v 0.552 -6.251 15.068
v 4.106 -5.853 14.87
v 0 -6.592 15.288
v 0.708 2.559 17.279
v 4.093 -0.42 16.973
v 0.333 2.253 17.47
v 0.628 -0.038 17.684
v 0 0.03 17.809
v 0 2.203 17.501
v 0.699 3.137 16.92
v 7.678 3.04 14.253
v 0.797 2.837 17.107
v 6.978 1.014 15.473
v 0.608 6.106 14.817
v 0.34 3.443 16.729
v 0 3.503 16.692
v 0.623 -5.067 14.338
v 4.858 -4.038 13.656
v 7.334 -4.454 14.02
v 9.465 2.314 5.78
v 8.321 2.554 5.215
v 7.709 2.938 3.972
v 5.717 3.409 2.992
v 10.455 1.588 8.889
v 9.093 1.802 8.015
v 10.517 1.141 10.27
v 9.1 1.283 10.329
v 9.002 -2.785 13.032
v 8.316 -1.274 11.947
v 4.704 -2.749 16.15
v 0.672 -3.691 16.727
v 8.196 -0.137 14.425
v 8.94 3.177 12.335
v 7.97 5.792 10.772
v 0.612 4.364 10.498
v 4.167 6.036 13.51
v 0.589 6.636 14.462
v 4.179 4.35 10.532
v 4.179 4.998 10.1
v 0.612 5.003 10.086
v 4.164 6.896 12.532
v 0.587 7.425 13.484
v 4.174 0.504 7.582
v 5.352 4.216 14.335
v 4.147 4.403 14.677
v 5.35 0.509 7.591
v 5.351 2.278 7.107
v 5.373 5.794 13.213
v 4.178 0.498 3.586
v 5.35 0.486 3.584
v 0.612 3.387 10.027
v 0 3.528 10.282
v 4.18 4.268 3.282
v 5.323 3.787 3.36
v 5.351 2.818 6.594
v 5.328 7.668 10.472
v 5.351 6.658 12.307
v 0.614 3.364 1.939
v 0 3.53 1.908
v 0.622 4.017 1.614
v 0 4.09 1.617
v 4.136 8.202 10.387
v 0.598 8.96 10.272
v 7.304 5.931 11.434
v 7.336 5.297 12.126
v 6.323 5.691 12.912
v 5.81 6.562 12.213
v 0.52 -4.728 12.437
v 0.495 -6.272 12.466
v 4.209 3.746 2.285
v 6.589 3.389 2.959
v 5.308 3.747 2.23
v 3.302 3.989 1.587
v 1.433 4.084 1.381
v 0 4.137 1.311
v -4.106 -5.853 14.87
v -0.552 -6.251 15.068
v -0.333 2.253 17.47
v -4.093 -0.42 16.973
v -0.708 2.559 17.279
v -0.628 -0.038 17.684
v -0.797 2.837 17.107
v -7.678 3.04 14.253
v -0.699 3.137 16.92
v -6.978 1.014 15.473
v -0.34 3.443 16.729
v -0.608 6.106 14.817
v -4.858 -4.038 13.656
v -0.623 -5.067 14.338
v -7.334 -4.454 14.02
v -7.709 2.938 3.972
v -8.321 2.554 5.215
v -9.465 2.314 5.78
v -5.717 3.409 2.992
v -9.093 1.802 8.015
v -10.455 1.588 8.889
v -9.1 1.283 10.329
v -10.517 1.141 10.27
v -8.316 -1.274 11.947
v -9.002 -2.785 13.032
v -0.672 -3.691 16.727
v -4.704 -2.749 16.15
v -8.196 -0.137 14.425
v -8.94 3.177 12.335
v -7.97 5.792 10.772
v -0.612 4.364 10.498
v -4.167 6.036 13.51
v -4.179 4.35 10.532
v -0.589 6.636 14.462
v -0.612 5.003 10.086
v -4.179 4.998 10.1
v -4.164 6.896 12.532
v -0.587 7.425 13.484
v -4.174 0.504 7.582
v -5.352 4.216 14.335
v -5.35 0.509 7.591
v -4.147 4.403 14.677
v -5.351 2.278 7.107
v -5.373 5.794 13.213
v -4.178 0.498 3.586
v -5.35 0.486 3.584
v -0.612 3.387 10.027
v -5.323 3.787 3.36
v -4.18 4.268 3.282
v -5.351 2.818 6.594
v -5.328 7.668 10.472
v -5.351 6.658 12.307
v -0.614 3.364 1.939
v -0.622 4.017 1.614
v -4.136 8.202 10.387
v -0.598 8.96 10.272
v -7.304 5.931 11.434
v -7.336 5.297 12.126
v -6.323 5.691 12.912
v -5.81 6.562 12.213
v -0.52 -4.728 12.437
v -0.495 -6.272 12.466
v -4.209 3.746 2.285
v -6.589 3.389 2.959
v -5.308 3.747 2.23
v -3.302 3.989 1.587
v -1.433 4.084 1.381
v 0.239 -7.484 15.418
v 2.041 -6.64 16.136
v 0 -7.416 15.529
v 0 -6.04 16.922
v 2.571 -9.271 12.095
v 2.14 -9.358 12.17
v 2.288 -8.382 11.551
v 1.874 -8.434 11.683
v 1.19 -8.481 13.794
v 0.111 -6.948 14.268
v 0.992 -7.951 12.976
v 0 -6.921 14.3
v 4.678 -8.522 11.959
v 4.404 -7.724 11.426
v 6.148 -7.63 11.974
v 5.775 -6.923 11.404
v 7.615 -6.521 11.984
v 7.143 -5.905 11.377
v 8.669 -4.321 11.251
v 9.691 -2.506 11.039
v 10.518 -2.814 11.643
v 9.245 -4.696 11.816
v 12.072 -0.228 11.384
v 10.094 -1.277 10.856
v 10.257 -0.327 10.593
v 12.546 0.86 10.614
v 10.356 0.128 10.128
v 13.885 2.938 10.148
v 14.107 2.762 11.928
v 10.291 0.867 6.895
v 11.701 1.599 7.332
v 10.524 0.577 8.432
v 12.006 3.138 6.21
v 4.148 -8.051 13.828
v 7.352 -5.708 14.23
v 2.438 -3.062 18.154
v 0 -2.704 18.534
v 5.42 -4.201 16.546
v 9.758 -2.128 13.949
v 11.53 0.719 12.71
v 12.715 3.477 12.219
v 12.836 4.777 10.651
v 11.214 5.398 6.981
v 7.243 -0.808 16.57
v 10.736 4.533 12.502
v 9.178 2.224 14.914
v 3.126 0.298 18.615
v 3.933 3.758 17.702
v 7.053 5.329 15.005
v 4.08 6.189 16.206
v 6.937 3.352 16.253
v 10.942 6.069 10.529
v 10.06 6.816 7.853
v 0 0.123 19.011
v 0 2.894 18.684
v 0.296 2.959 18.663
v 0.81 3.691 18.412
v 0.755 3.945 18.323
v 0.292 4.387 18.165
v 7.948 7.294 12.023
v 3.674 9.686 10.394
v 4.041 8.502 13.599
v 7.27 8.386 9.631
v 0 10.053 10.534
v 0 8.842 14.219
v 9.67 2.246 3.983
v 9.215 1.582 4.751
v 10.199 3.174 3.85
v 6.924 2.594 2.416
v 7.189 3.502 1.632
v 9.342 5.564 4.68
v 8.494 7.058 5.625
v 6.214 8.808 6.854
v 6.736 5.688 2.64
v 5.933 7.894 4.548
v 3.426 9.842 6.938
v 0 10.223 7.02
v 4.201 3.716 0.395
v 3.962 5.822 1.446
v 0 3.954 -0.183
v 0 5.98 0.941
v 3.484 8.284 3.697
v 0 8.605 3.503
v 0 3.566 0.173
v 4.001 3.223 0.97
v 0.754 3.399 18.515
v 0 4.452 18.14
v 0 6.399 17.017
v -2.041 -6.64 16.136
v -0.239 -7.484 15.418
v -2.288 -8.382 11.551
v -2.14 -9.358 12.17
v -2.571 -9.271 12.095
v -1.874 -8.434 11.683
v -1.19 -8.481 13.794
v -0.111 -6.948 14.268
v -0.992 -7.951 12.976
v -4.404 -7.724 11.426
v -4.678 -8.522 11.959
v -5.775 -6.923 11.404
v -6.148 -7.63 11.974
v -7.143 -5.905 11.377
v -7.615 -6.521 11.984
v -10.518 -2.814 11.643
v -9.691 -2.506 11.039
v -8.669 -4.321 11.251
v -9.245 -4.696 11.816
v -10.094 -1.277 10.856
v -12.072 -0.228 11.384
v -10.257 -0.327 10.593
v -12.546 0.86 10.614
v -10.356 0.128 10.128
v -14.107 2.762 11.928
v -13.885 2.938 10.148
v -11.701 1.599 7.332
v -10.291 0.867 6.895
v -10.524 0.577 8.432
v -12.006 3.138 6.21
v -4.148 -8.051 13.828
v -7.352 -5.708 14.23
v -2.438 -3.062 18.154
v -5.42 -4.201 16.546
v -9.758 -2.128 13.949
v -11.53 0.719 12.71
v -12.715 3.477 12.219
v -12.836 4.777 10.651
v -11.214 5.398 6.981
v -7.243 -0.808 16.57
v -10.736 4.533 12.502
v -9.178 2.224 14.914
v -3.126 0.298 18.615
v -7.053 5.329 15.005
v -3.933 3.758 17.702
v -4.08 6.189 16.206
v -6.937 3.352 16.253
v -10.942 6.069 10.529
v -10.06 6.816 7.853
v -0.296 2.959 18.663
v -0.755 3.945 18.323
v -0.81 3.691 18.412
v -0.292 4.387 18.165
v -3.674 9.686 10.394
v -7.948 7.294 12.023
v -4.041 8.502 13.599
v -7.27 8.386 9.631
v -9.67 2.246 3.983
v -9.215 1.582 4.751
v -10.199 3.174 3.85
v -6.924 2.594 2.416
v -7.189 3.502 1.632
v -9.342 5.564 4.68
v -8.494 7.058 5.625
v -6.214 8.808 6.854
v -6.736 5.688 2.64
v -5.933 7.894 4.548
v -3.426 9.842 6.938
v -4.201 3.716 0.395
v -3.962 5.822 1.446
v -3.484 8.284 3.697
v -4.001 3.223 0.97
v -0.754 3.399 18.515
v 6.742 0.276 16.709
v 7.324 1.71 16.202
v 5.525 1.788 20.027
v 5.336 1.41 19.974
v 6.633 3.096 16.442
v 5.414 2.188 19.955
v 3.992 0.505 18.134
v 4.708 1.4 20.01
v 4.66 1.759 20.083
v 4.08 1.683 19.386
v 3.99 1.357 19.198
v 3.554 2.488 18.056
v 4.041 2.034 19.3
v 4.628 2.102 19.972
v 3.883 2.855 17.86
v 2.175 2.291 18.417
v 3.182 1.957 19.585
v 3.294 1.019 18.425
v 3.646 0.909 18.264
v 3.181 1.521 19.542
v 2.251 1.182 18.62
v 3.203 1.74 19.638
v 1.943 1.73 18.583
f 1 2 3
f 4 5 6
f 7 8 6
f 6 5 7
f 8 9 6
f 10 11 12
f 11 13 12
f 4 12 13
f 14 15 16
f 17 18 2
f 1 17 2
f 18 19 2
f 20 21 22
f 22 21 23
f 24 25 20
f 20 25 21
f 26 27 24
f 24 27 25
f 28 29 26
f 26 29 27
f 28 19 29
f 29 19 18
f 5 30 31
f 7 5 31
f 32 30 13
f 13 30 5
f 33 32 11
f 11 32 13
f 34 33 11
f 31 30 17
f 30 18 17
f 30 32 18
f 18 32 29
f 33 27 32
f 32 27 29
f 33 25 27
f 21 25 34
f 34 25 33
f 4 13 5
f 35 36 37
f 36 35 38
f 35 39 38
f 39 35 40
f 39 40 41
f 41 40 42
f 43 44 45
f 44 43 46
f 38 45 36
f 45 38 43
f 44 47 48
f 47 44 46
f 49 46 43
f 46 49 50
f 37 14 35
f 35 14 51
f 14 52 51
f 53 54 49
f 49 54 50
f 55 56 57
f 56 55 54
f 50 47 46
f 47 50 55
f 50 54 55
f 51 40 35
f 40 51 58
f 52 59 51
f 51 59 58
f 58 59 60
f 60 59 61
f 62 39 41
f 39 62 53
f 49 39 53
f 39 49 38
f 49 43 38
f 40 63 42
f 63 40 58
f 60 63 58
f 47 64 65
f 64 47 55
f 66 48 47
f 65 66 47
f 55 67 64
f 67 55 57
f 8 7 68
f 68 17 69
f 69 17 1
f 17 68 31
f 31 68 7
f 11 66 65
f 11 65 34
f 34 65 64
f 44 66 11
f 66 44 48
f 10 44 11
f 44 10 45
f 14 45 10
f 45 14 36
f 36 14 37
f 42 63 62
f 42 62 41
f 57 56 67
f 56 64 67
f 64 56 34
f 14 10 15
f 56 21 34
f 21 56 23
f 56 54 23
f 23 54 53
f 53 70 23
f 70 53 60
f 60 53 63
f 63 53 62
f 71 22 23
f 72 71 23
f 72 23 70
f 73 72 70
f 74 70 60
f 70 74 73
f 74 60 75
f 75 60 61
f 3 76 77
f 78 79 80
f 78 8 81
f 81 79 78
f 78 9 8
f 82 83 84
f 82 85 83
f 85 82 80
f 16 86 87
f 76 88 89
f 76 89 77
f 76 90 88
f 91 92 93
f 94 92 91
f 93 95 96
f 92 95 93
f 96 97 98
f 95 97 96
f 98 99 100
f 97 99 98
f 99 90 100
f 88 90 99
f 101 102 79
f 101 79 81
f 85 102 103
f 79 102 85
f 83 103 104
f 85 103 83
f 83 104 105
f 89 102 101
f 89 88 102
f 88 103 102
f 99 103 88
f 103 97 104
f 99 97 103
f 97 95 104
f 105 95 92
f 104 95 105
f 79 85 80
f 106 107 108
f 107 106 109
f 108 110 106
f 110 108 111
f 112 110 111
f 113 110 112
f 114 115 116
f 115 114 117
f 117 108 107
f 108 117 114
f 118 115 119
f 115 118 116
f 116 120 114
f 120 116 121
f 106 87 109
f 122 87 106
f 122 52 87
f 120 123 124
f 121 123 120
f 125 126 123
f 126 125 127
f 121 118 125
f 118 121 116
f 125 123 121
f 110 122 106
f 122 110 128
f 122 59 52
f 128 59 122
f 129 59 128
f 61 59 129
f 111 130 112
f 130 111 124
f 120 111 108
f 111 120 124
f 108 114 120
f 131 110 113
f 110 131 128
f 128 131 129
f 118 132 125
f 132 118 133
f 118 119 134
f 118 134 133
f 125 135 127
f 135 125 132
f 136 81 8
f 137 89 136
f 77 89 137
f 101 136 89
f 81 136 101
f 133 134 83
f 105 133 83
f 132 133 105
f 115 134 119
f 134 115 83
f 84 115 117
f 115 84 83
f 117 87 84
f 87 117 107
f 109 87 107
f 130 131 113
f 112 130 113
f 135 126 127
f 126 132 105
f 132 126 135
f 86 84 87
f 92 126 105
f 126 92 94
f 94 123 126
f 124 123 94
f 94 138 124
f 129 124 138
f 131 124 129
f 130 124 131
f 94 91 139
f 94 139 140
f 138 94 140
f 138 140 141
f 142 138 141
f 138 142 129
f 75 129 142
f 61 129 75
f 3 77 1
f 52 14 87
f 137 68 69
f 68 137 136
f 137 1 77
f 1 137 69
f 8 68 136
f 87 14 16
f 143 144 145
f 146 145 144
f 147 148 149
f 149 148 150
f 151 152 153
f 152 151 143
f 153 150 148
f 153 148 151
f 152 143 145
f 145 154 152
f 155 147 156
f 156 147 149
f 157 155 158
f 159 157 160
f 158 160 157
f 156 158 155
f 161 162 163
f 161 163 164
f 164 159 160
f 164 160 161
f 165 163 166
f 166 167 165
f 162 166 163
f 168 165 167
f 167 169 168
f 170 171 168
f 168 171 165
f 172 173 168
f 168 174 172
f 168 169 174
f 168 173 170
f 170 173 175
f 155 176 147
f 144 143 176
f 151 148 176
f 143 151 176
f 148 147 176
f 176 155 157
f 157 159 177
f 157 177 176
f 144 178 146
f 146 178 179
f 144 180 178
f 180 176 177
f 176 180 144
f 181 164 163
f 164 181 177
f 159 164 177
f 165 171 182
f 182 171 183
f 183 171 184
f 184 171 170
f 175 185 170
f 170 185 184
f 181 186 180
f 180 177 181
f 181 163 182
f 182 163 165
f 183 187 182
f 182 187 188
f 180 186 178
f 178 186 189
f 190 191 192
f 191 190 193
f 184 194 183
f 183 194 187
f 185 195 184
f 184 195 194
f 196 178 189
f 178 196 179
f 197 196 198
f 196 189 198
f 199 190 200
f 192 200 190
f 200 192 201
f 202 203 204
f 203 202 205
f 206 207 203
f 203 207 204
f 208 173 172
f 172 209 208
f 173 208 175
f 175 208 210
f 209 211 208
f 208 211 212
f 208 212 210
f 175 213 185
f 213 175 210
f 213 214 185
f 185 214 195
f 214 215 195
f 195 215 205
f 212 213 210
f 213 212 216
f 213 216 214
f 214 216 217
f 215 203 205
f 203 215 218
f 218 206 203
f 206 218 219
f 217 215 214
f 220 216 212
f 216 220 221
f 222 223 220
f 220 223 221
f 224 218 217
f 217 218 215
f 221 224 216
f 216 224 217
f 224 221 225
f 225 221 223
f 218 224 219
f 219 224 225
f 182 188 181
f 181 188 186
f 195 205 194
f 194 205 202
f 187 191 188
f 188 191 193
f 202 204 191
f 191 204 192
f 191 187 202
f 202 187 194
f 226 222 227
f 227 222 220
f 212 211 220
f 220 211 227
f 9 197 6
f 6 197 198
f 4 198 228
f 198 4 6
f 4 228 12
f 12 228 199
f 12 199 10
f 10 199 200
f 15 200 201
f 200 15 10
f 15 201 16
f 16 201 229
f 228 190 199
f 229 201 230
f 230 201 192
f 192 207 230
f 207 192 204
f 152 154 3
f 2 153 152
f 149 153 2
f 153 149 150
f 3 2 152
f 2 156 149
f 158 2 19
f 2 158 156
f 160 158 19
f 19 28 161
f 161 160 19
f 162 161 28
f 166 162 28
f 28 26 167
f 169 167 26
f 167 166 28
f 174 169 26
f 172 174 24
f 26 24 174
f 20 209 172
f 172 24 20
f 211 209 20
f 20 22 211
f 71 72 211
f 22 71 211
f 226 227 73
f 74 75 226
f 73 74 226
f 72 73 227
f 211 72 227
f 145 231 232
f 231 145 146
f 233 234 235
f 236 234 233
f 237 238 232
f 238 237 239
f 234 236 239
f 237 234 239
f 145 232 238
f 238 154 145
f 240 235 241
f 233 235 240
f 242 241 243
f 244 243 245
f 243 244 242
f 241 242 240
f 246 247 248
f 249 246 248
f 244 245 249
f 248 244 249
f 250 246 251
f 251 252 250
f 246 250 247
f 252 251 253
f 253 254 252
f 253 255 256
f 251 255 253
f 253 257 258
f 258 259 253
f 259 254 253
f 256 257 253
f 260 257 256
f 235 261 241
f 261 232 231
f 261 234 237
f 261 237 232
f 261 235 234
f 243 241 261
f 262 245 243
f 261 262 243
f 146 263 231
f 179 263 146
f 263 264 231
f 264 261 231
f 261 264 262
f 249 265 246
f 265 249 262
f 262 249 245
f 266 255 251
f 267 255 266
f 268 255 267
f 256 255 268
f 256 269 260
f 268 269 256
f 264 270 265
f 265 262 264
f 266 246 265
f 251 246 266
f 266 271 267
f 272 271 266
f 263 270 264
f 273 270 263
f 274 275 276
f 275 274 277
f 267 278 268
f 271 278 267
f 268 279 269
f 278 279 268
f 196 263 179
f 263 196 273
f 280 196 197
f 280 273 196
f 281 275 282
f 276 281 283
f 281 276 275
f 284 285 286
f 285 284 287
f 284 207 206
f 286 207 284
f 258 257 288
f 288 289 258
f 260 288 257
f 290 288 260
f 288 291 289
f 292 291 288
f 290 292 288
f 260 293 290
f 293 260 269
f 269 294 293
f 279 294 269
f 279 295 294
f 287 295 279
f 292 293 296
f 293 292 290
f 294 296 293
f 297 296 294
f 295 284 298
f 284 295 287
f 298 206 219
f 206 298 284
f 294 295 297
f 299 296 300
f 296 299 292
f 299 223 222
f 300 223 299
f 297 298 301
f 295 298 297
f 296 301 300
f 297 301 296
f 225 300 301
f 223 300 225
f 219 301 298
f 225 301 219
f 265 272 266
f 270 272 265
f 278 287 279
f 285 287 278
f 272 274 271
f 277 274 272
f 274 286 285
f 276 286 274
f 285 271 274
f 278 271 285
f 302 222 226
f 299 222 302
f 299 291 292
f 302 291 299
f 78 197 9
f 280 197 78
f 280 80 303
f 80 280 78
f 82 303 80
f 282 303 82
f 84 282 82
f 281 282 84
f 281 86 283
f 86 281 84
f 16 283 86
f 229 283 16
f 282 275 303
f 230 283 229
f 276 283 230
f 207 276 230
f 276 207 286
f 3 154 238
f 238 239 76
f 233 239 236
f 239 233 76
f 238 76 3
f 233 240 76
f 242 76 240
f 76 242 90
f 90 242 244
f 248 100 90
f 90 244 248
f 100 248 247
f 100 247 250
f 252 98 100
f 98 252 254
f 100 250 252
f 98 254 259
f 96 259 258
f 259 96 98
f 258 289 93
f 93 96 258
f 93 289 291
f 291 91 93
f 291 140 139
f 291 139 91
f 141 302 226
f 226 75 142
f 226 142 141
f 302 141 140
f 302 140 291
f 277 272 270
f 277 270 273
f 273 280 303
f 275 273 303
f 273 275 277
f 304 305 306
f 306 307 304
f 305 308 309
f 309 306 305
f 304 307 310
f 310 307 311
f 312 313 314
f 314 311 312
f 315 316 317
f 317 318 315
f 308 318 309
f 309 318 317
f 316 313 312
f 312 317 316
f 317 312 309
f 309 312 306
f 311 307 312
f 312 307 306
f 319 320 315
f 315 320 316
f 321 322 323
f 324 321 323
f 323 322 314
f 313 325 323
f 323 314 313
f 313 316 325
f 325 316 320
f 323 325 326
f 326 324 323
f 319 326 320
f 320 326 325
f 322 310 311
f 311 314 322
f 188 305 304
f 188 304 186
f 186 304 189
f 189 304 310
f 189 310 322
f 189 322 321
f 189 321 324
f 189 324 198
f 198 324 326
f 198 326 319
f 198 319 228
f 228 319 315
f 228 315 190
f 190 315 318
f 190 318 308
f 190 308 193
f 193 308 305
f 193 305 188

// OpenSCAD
use <../lib.scad>
use <s/u9447s01.scad>
use <s/u9447s02.scad>
function ldraw_lib__u9447() = [
// 0 ~Minifig Hair Powerpuff Girls Buttercup
// 0 Name: u9447.dat
// 0 Author: Magnus Forsberg [MagFors]
// 0 !LDRAW_ORG Part UPDATE 2023-05
// 0 !LICENSE Licensed under CC BY 4.0 : see CAreadme.txt
// 
// 0 BFC CERTIFY CCW
  [0,"BFC","CERTIFY"],
  [0,"BFC","CCW"],
// 
// 0 !HISTORY 2023-10-31 [OrionP] Official Update 2023-05
// 
// 
// 1 16 0 0 0 1 0 0 0 1 0 0 0 1 s\u9447s01.dat
  [1,16,0,0,0,1,0,0,0,1,0,0,0,1, ldraw_lib__s__u9447s01()],
// 1 16 0 0 0 1 0 0 0 1 0 0 0 1 s\u9447s02.dat
  [1,16,0,0,0,1,0,0,0,1,0,0,0,1, ldraw_lib__s__u9447s02()],
// 1 16 0 0 0 -1 0 0 0 1 0 0 0 1 s\u9447s02.dat
  [1,16,0,0,0,-1,0,0,0,1,0,0,0,1, ldraw_lib__s__u9447s02()],
// 
// 0 // right
// 3 16 -17.343 -40.632 8.379 -22.944 -37.286 5.56 -18.107 -41.424 -2.02
  [3,16,-17.343,-40.632,8.379,-22.944,-37.286,5.56,-18.107,-41.424,-2.02],
// 3 16 -17.343 -40.632 8.379 -18.107 -41.424 -2.02 -7.816 -46.537 .744
  [3,16,-17.343,-40.632,8.379,-18.107,-41.424,-2.02,-7.816,-46.537,.744],
// 3 16 -7.816 -46.537 .744 -.741 -46.658 7.398 -1.886 -46.287 8.497
  [3,16,-7.816,-46.537,.744,-.741,-46.658,7.398,-1.886,-46.287,8.497],
// 3 16 -9.832 -44.255 9.395 -7.816 -46.537 .744 -1.886 -46.287 8.497
  [3,16,-9.832,-44.255,9.395,-7.816,-46.537,.744,-1.886,-46.287,8.497],
// 3 16 -7.816 -46.537 .744 -9.832 -44.255 9.395 -17.343 -40.632 8.379
  [3,16,-7.816,-46.537,.744,-9.832,-44.255,9.395,-17.343,-40.632,8.379],
// 5 24 -17.343 -40.632 8.379 -7.816 -46.537 .744 -18.107 -41.424 -2.02 -9.832 -44.255 9.395
  [5,24,-17.343,-40.632,8.379,-7.816,-46.537,.744,-18.107,-41.424,-2.02,-9.832,-44.255,9.395],
// 5 24 -22.944 -37.286 5.56 -18.107 -41.424 -2.02 -17.343 -40.632 8.379 -24.396 -34.873 -5.319
  [5,24,-22.944,-37.286,5.56,-18.107,-41.424,-2.02,-17.343,-40.632,8.379,-24.396,-34.873,-5.319],
// 5 24 -17.343 -40.632 8.379 -22.944 -37.286 5.56 -18.107 -41.424 -2.02 -17.633 -37.512 13.322
  [5,24,-17.343,-40.632,8.379,-22.944,-37.286,5.56,-18.107,-41.424,-2.02,-17.633,-37.512,13.322],
// 5 24 -1.886 -46.287 8.497 -7.816 -46.537 .744 -9.832 -44.255 9.395 -.741 -46.658 7.398
  [5,24,-1.886,-46.287,8.497,-7.816,-46.537,.744,-9.832,-44.255,9.395,-.741,-46.658,7.398],
// 5 24 -1.886 -46.287 8.497 -9.832 -44.255 9.395 -7.816 -46.537 .744 -2.024 -46.031 9.227
  [5,24,-1.886,-46.287,8.497,-9.832,-44.255,9.395,-7.816,-46.537,.744,-2.024,-46.031,9.227],
// 5 24 -18.107 -41.424 -2.02 -17.343 -40.632 8.379 -22.944 -37.286 5.56 -7.816 -46.537 .744
  [5,24,-18.107,-41.424,-2.02,-17.343,-40.632,8.379,-22.944,-37.286,5.56,-7.816,-46.537,.744],
// 5 24 -9.832 -44.255 9.395 -17.343 -40.632 8.379 -10.199 -40.515 15.472 -7.816 -46.537 .744
  [5,24,-9.832,-44.255,9.395,-17.343,-40.632,8.379,-10.199,-40.515,15.472,-7.816,-46.537,.744],
// 5 24 -18.107 -41.424 -2.02 -7.816 -46.537 .744 -17.343 -40.632 8.379 -6.094 -45.384 -7.656
  [5,24,-18.107,-41.424,-2.02,-7.816,-46.537,.744,-17.343,-40.632,8.379,-6.094,-45.384,-7.656],
// 5 24 -7.816 -46.537 .744 -.741 -46.658 7.398 0 -47.528 .308 -1.886 -46.287 8.497
  [5,24,-7.816,-46.537,.744,-.741,-46.658,7.398,0,-47.528,.308,-1.886,-46.287,8.497],
// 
// 0 // left
// 5 24 13.341 -49.935 3.526 16.8545 -41.7735 .69 13.813 -50.067 4.47 9.9792 -45.3358 1.2634
  [5,24,13.341,-49.935,3.526,16.8545,-41.7735,.69,13.813,-50.067,4.47,9.9792,-45.3358,1.2634],
// 5 24 13.813 -50.067 4.47 13.341 -49.935 3.526 11.65 -50.207 4.398 16.8545 -41.7735 .69
  [5,24,13.813,-50.067,4.47,13.341,-49.935,3.526,11.65,-50.207,4.398,16.8545,-41.7735,.69],
// 2 24 16.8545 -41.7735 .69 18.3111 -40.5045 4.2748
  [2,24,16.8545,-41.7735,.69,18.3111,-40.5045,4.2748],
// 5 24 13.536 -49.887 5.469 13.813 -50.067 4.47 11.65 -50.207 4.398 18.3111 -40.5045 4.2748
  [5,24,13.536,-49.887,5.469,13.813,-50.067,4.47,11.65,-50.207,4.398,18.3111,-40.5045,4.2748],
// 5 24 16.5834 -41.1062 7.7404 13.536 -49.887 5.469 9.7063 -44.6496 7.1365 18.3111 -40.5045 4.2748
  [5,24,16.5834,-41.1062,7.7404,13.536,-49.887,5.469,9.7063,-44.6496,7.1365,18.3111,-40.5045,4.2748],
// 2 24 18.3111 -40.5045 4.2748 16.5834 -41.1062 7.7404
  [2,24,18.3111,-40.5045,4.2748,16.5834,-41.1062,7.7404],
// 2 24 9.9792 -45.3358 1.2634 16.8545 -41.7735 .69
  [2,24,9.9792,-45.3358,1.2634,16.8545,-41.7735,.69],
// 5 24 13.341 -49.935 3.526 11.77 -50.025 3.5 11.65 -50.207 4.398 9.9792 -45.3358 1.2634
  [5,24,13.341,-49.935,3.526,11.77,-50.025,3.5,11.65,-50.207,4.398,9.9792,-45.3358,1.2634],
// 5 24 11.77 -50.025 3.5 9.9792 -45.3358 1.2634 13.341 -49.935 3.526 9.1151 -45.6603 2.2726
  [5,24,11.77,-50.025,3.5,9.9792,-45.3358,1.2634,13.341,-49.935,3.526,9.1151,-45.6603,2.2726],
// 2 24 9.1151 -45.6603 2.2726 9.9792 -45.3358 1.2634
  [2,24,9.1151,-45.6603,2.2726,9.9792,-45.3358,1.2634],
// 2 24 9.974 -47.995 3.392 9.1151 -45.6603 2.2726
  [2,24,9.974,-47.995,3.392,9.1151,-45.6603,2.2726],
// 5 24 11.77 -50.025 3.5 9.974 -47.995 3.392 11.65 -50.207 4.398 9.1151 -45.6603 2.2726
  [5,24,11.77,-50.025,3.5,9.974,-47.995,3.392,11.65,-50.207,4.398,9.1151,-45.6603,2.2726],
// 5 24 11.77 -50.025 3.5 11.65 -50.207 4.398 13.341 -49.935 3.526 9.974 -47.995 3.392
  [5,24,11.77,-50.025,3.5,11.65,-50.207,4.398,13.341,-49.935,3.526,9.974,-47.995,3.392],
// 2 24 10.201 -48.465 4.208 9.974 -47.995 3.392
  [2,24,10.201,-48.465,4.208,9.974,-47.995,3.392],
// 2 24 8.884 -45.141 6.219 10.103 -48.251 5.085
  [2,24,8.884,-45.141,6.219,10.103,-48.251,5.085],
// 2 24 9.7063 -44.6496 7.1365 8.884 -45.141 6.219
  [2,24,9.7063,-44.6496,7.1365,8.884,-45.141,6.219],
// 5 24 10.103 -48.251 5.085 11.57 -49.931 5.254 8.884 -45.141 6.219 11.65 -50.207 4.398
  [5,24,10.103,-48.251,5.085,11.57,-49.931,5.254,8.884,-45.141,6.219,11.65,-50.207,4.398],
// 5 24 11.57 -49.931 5.254 9.7063 -44.6496 7.1365 8.884 -45.141 6.219 13.536 -49.887 5.469
  [5,24,11.57,-49.931,5.254,9.7063,-44.6496,7.1365,8.884,-45.141,6.219,13.536,-49.887,5.469],
// 2 24 16.5834 -41.1062 7.7404 9.7063 -44.6496 7.1365
  [2,24,16.5834,-41.1062,7.7404,9.7063,-44.6496,7.1365],
// 5 24 11.57 -49.931 5.254 13.536 -49.887 5.469 11.65 -50.207 4.398 9.7063 -44.6496 7.1365
  [5,24,11.57,-49.931,5.254,13.536,-49.887,5.469,11.65,-50.207,4.398,9.7063,-44.6496,7.1365],
// 2 24 10.103 -48.251 5.085 10.201 -48.465 4.208
  [2,24,10.103,-48.251,5.085,10.201,-48.465,4.208],
// 5 24 11.65 -50.207 4.398 11.57 -49.931 5.254 13.536 -49.887 5.469 10.103 -48.251 5.085
  [5,24,11.65,-50.207,4.398,11.57,-49.931,5.254,13.536,-49.887,5.469,10.103,-48.251,5.085],
// 5 24 5.4373 -46.0437 5.7282 7.955 -48.963 4.893 8.884 -45.141 6.219 4.8577 -46.4585 4.3258
  [5,24,5.4373,-46.0437,5.7282,7.955,-48.963,4.893,8.884,-45.141,6.219,4.8577,-46.4585,4.3258],
// 2 24 8.884 -45.141 6.219 5.4373 -46.0437 5.7282
  [2,24,8.884,-45.141,6.219,5.4373,-46.0437,5.7282],
// 5 24 7.955 -48.963 4.893 10.103 -48.251 5.085 8.007 -49.095 4.35 8.884 -45.141 6.219
  [5,24,7.955,-48.963,4.893,10.103,-48.251,5.085,8.007,-49.095,4.35,8.884,-45.141,6.219],
// 2 24 8.2361 -46.0615 2.5466 9.1151 -45.6603 2.2726
  [2,24,8.2361,-46.0615,2.5466,9.1151,-45.6603,2.2726],
// 2 24 5.6283 -46.5498 2.9542 8.2361 -46.0615 2.5466
  [2,24,5.6283,-46.5498,2.9542,8.2361,-46.0615,2.5466],
// 5 24 7.953 -48.856 3.803 5.6283 -46.5498 2.9542 8.2361 -46.0615 2.5466 4.8577 -46.4585 4.3258
  [5,24,7.953,-48.856,3.803,5.6283,-46.5498,2.9542,8.2361,-46.0615,2.5466,4.8577,-46.4585,4.3258],
// 5 24 9.974 -47.995 3.392 7.953 -48.856 3.803 9.1151 -45.6603 2.2726 10.201 -48.465 4.208
  [5,24,9.974,-47.995,3.392,7.953,-48.856,3.803,9.1151,-45.6603,2.2726,10.201,-48.465,4.208],
// 5 24 8.007 -49.095 4.35 7.953 -48.856 3.803 4.8577 -46.4585 4.3258 10.201 -48.465 4.208
  [5,24,8.007,-49.095,4.35,7.953,-48.856,3.803,4.8577,-46.4585,4.3258,10.201,-48.465,4.208],
// 5 24 7.955 -48.963 4.893 8.007 -49.095 4.35 10.103 -48.251 5.085 4.8577 -46.4585 4.3258
  [5,24,7.955,-48.963,4.893,8.007,-49.095,4.35,10.103,-48.251,5.085,4.8577,-46.4585,4.3258],
// 2 24 4.8577 -46.4585 4.3258 5.6283 -46.5498 2.9542
  [2,24,4.8577,-46.4585,4.3258,5.6283,-46.5498,2.9542],
// 2 24 5.4373 -46.0437 5.7282 4.8577 -46.4585 4.3258
  [2,24,5.4373,-46.0437,5.7282,4.8577,-46.4585,4.3258],
// 3 16 16.8545 -41.7735 .69 18.3111 -40.5045 4.2748 13.813 -50.067 4.47
  [3,16,16.8545,-41.7735,.69,18.3111,-40.5045,4.2748,13.813,-50.067,4.47],
// 3 16 13.813 -50.067 4.47 13.341 -49.935 3.526 16.8545 -41.7735 .69
  [3,16,13.813,-50.067,4.47,13.341,-49.935,3.526,16.8545,-41.7735,.69],
// 3 16 18.3111 -40.5045 4.2748 16.5834 -41.1062 7.7404 13.536 -49.887 5.469
  [3,16,18.3111,-40.5045,4.2748,16.5834,-41.1062,7.7404,13.536,-49.887,5.469],
// 3 16 13.536 -49.887 5.469 13.813 -50.067 4.47 18.3111 -40.5045 4.2748
  [3,16,13.536,-49.887,5.469,13.813,-50.067,4.47,18.3111,-40.5045,4.2748],
// 3 16 16.8545 -41.7735 .69 13.341 -49.935 3.526 9.9792 -45.3358 1.2634
  [3,16,16.8545,-41.7735,.69,13.341,-49.935,3.526,9.9792,-45.3358,1.2634],
// 3 16 9.9792 -45.3358 1.2634 13.341 -49.935 3.526 11.77 -50.025 3.5
  [3,16,9.9792,-45.3358,1.2634,13.341,-49.935,3.526,11.77,-50.025,3.5],
// 3 16 11.65 -50.207 4.398 10.201 -48.465 4.208 9.974 -47.995 3.392
  [3,16,11.65,-50.207,4.398,10.201,-48.465,4.208,9.974,-47.995,3.392],
// 3 16 9.974 -47.995 3.392 11.77 -50.025 3.5 11.65 -50.207 4.398
  [3,16,9.974,-47.995,3.392,11.77,-50.025,3.5,11.65,-50.207,4.398],
// 3 16 8.884 -45.141 6.219 10.103 -48.251 5.085 11.57 -49.931 5.254
  [3,16,8.884,-45.141,6.219,10.103,-48.251,5.085,11.57,-49.931,5.254],
// 3 16 11.57 -49.931 5.254 9.7063 -44.6496 7.1365 8.884 -45.141 6.219
  [3,16,11.57,-49.931,5.254,9.7063,-44.6496,7.1365,8.884,-45.141,6.219],
// 3 16 16.5834 -41.1062 7.7404 9.7063 -44.6496 7.1365 13.536 -49.887 5.469
  [3,16,16.5834,-41.1062,7.7404,9.7063,-44.6496,7.1365,13.536,-49.887,5.469],
// 3 16 13.536 -49.887 5.469 9.7063 -44.6496 7.1365 11.57 -49.931 5.254
  [3,16,13.536,-49.887,5.469,9.7063,-44.6496,7.1365,11.57,-49.931,5.254],
// 3 16 10.103 -48.251 5.085 10.201 -48.465 4.208 11.65 -50.207 4.398
  [3,16,10.103,-48.251,5.085,10.201,-48.465,4.208,11.65,-50.207,4.398],
// 3 16 11.65 -50.207 4.398 11.57 -49.931 5.254 10.103 -48.251 5.085
  [3,16,11.65,-50.207,4.398,11.57,-49.931,5.254,10.103,-48.251,5.085],
// 3 16 11.57 -49.931 5.254 11.65 -50.207 4.398 13.536 -49.887 5.469
  [3,16,11.57,-49.931,5.254,11.65,-50.207,4.398,13.536,-49.887,5.469],
// 3 16 13.536 -49.887 5.469 11.65 -50.207 4.398 13.813 -50.067 4.47
  [3,16,13.536,-49.887,5.469,11.65,-50.207,4.398,13.813,-50.067,4.47],
// 3 16 11.77 -50.025 3.5 13.341 -49.935 3.526 11.65 -50.207 4.398
  [3,16,11.77,-50.025,3.5,13.341,-49.935,3.526,11.65,-50.207,4.398],
// 3 16 11.65 -50.207 4.398 13.341 -49.935 3.526 13.813 -50.067 4.47
  [3,16,11.65,-50.207,4.398,13.341,-49.935,3.526,13.813,-50.067,4.47],
// 3 16 5.4373 -46.0437 5.7282 7.955 -48.963 4.893 8.884 -45.141 6.219
  [3,16,5.4373,-46.0437,5.7282,7.955,-48.963,4.893,8.884,-45.141,6.219],
// 3 16 8.884 -45.141 6.219 7.955 -48.963 4.893 10.103 -48.251 5.085
  [3,16,8.884,-45.141,6.219,7.955,-48.963,4.893,10.103,-48.251,5.085],
// 3 16 8.2361 -46.0615 2.5466 9.1151 -45.6603 2.2726 7.953 -48.856 3.803
  [3,16,8.2361,-46.0615,2.5466,9.1151,-45.6603,2.2726,7.953,-48.856,3.803],
// 3 16 5.6283 -46.5498 2.9542 8.2361 -46.0615 2.5466 7.953 -48.856 3.803
  [3,16,5.6283,-46.5498,2.9542,8.2361,-46.0615,2.5466,7.953,-48.856,3.803],
// 3 16 7.953 -48.856 3.803 9.1151 -45.6603 2.2726 9.974 -47.995 3.392
  [3,16,7.953,-48.856,3.803,9.1151,-45.6603,2.2726,9.974,-47.995,3.392],
// 3 16 10.201 -48.465 4.208 8.007 -49.095 4.35 7.953 -48.856 3.803
  [3,16,10.201,-48.465,4.208,8.007,-49.095,4.35,7.953,-48.856,3.803],
// 3 16 7.953 -48.856 3.803 9.974 -47.995 3.392 10.201 -48.465 4.208
  [3,16,7.953,-48.856,3.803,9.974,-47.995,3.392,10.201,-48.465,4.208],
// 3 16 10.201 -48.465 4.208 10.103 -48.251 5.085 8.007 -49.095 4.35
  [3,16,10.201,-48.465,4.208,10.103,-48.251,5.085,8.007,-49.095,4.35],
// 3 16 8.007 -49.095 4.35 10.103 -48.251 5.085 7.955 -48.963 4.893
  [3,16,8.007,-49.095,4.35,10.103,-48.251,5.085,7.955,-48.963,4.893],
// 3 16 7.953 -48.856 3.803 8.007 -49.095 4.35 4.8577 -46.4585 4.3258
  [3,16,7.953,-48.856,3.803,8.007,-49.095,4.35,4.8577,-46.4585,4.3258],
// 3 16 4.8577 -46.4585 4.3258 5.6283 -46.5498 2.9542 7.953 -48.856 3.803
  [3,16,4.8577,-46.4585,4.3258,5.6283,-46.5498,2.9542,7.953,-48.856,3.803],
// 3 16 5.4373 -46.0437 5.7282 4.8577 -46.4585 4.3258 7.955 -48.963 4.893
  [3,16,5.4373,-46.0437,5.7282,4.8577,-46.4585,4.3258,7.955,-48.963,4.893],
// 3 16 7.955 -48.963 4.893 4.8577 -46.4585 4.3258 8.007 -49.095 4.35
  [3,16,7.955,-48.963,4.893,4.8577,-46.4585,4.3258,8.007,-49.095,4.35],
// 3 16 9.1151 -45.6603 2.2726 9.9792 -45.3358 1.2634 11.77 -50.025 3.5
  [3,16,9.1151,-45.6603,2.2726,9.9792,-45.3358,1.2634,11.77,-50.025,3.5],
// 3 16 11.77 -50.025 3.5 9.974 -47.995 3.392 9.1151 -45.6603 2.2726
  [3,16,11.77,-50.025,3.5,9.974,-47.995,3.392,9.1151,-45.6603,2.2726],
// 
// 3 16 22.944 -37.286 5.56 18.3111 -40.5045 4.2748 16.8545 -41.7735 .69
  [3,16,22.944,-37.286,5.56,18.3111,-40.5045,4.2748,16.8545,-41.7735,.69],
// 3 16 22.944 -37.286 5.56 16.8545 -41.7735 .69 18.107 -41.424 -2.02
  [3,16,22.944,-37.286,5.56,16.8545,-41.7735,.69,18.107,-41.424,-2.02],
// 3 16 18.107 -41.424 -2.02 16.8545 -41.7735 .69 7.816 -46.537 .744
  [3,16,18.107,-41.424,-2.02,16.8545,-41.7735,.69,7.816,-46.537,.744],
// 3 16 7.816 -46.537 .744 16.8545 -41.7735 .69 9.9792 -45.3358 1.2634
  [3,16,7.816,-46.537,.744,16.8545,-41.7735,.69,9.9792,-45.3358,1.2634],
// 3 16 7.816 -46.537 .744 9.9792 -45.3358 1.2634 9.1151 -45.6603 2.2726
  [3,16,7.816,-46.537,.744,9.9792,-45.3358,1.2634,9.1151,-45.6603,2.2726],
// 3 16 7.816 -46.537 .744 9.1151 -45.6603 2.2726 8.2361 -46.0615 2.5466
  [3,16,7.816,-46.537,.744,9.1151,-45.6603,2.2726,8.2361,-46.0615,2.5466],
// 3 16 7.816 -46.537 .744 8.2361 -46.0615 2.5466 5.6283 -46.5498 2.9542
  [3,16,7.816,-46.537,.744,8.2361,-46.0615,2.5466,5.6283,-46.5498,2.9542],
// 3 16 7.816 -46.537 .744 5.6283 -46.5498 2.9542 .741 -46.658 7.398
  [3,16,7.816,-46.537,.744,5.6283,-46.5498,2.9542,.741,-46.658,7.398],
// 3 16 .741 -46.658 7.398 5.6283 -46.5498 2.9542 4.8577 -46.4585 4.3258
  [3,16,.741,-46.658,7.398,5.6283,-46.5498,2.9542,4.8577,-46.4585,4.3258],
// 3 16 .741 -46.658 7.398 4.8577 -46.4585 4.3258 5.4373 -46.0437 5.7282
  [3,16,.741,-46.658,7.398,4.8577,-46.4585,4.3258,5.4373,-46.0437,5.7282],
// 3 16 .741 -46.658 7.398 5.4373 -46.0437 5.7282 1.886 -46.287 8.497
  [3,16,.741,-46.658,7.398,5.4373,-46.0437,5.7282,1.886,-46.287,8.497],
// 3 16 1.886 -46.287 8.497 5.4373 -46.0437 5.7282 8.884 -45.141 6.219
  [3,16,1.886,-46.287,8.497,5.4373,-46.0437,5.7282,8.884,-45.141,6.219],
// 3 16 1.886 -46.287 8.497 8.884 -45.141 6.219 9.832 -44.255 9.395
  [3,16,1.886,-46.287,8.497,8.884,-45.141,6.219,9.832,-44.255,9.395],
// 3 16 9.832 -44.255 9.395 8.884 -45.141 6.219 9.7063 -44.6496 7.1365
  [3,16,9.832,-44.255,9.395,8.884,-45.141,6.219,9.7063,-44.6496,7.1365],
// 3 16 9.832 -44.255 9.395 9.7063 -44.6496 7.1365 16.5834 -41.1062 7.7404
  [3,16,9.832,-44.255,9.395,9.7063,-44.6496,7.1365,16.5834,-41.1062,7.7404],
// 3 16 9.832 -44.255 9.395 16.5834 -41.1062 7.7404 17.343 -40.632 8.379
  [3,16,9.832,-44.255,9.395,16.5834,-41.1062,7.7404,17.343,-40.632,8.379],
// 3 16 17.343 -40.632 8.379 16.5834 -41.1062 7.7404 18.3111 -40.5045 4.2748
  [3,16,17.343,-40.632,8.379,16.5834,-41.1062,7.7404,18.3111,-40.5045,4.2748],
// 3 16 17.343 -40.632 8.379 18.3111 -40.5045 4.2748 22.944 -37.286 5.56
  [3,16,17.343,-40.632,8.379,18.3111,-40.5045,4.2748,22.944,-37.286,5.56],
// 
// 5 24 0 -35.749 -17.303 0 -38.22 -16.481 .277 -35.67 -17.371 -.277 -35.67 -17.371
  [5,24,0,-35.749,-17.303,0,-38.22,-16.481,.277,-35.67,-17.371,-.277,-35.67,-17.371],
// 5 24 0 -3.278 10.342 0 -.433 8.9147 3.541 -3.453 10.211 -3.541 -3.453 10.211
  [5,24,0,-3.278,10.342,0,-.433,8.9147,3.541,-3.453,10.211,-3.541,-3.453,10.211],
// 5 24 -7.816 -46.537 .744 -9.832 -44.255 9.395 -1.886 -46.287 8.497 -17.343 -40.632 8.379
  [5,24,-7.816,-46.537,.744,-9.832,-44.255,9.395,-1.886,-46.287,8.497,-17.343,-40.632,8.379],
// 5 24 .741 -46.658 7.398 7.816 -46.537 .744 0 -47.528 .308 5.6283 -46.5498 2.9542
  [5,24,.741,-46.658,7.398,7.816,-46.537,.744,0,-47.528,.308,5.6283,-46.5498,2.9542],
// 5 24 9.832 -44.255 9.395 1.886 -46.287 8.497 8.884 -45.141 6.219 2.024 -46.031 9.227
  [5,24,9.832,-44.255,9.395,1.886,-46.287,8.497,8.884,-45.141,6.219,2.024,-46.031,9.227],
// 5 24 13.341 -49.935 3.526 11.65 -50.207 4.398 11.77 -50.025 3.5 13.813 -50.067 4.47
  [5,24,13.341,-49.935,3.526,11.65,-50.207,4.398,11.77,-50.025,3.5,13.813,-50.067,4.47],
// 5 24 16.8545 -41.7735 .69 18.107 -41.424 -2.02 22.944 -37.286 5.56 7.816 -46.537 .744
  [5,24,16.8545,-41.7735,.69,18.107,-41.424,-2.02,22.944,-37.286,5.56,7.816,-46.537,.744],
// 5 24 11.77 -50.025 3.5 9.1151 -45.6603 2.2726 9.974 -47.995 3.392 9.9792 -45.3358 1.2634
  [5,24,11.77,-50.025,3.5,9.1151,-45.6603,2.2726,9.974,-47.995,3.392,9.9792,-45.3358,1.2634],
// 5 24 9.7063 -44.6496 7.1365 9.832 -44.255 9.395 8.884 -45.141 6.219 16.5834 -41.1062 7.7404
  [5,24,9.7063,-44.6496,7.1365,9.832,-44.255,9.395,8.884,-45.141,6.219,16.5834,-41.1062,7.7404],
// 5 24 0 -38.822 -18.54 0 -35.749 -17.303 .277 -35.67 -17.371 -.277 -35.67 -17.371
  [5,24,0,-38.822,-18.54,0,-35.749,-17.303,.277,-35.67,-17.371,-.277,-35.67,-17.371],
// 5 24 0 -17.551 25.557 0 -26.334 25.133 -8.564 -17.346 24.604 8.564 -17.346 24.604
  [5,24,0,-17.551,25.557,0,-26.334,25.133,-8.564,-17.346,24.604,8.564,-17.346,24.604],
// 5 24 11.65 -50.207 4.398 9.974 -47.995 3.392 10.201 -48.465 4.208 11.77 -50.025 3.5
  [5,24,11.65,-50.207,4.398,9.974,-47.995,3.392,10.201,-48.465,4.208,11.77,-50.025,3.5],
// 5 24 13.813 -50.067 4.47 16.8545 -41.7735 .69 18.3111 -40.5045 4.2748 13.341 -49.935 3.526
  [5,24,13.813,-50.067,4.47,16.8545,-41.7735,.69,18.3111,-40.5045,4.2748,13.341,-49.935,3.526],
// 5 24 0 .457 9.8847 0 -2.352 14.951 10.502 -.987 9.29 -10.502 -.987 9.29
  [5,24,0,.457,9.8847,0,-2.352,14.951,10.502,-.987,9.29,-10.502,-.987,9.29],
// 5 24 0 -42.542 15.997 0 -45.35 11.129 .729 -45.412 10.968 -.729 -45.412 10.968
  [5,24,0,-42.542,15.997,0,-45.35,11.129,.729,-45.412,10.968,-.729,-45.412,10.968],
// 5 24 13.536 -49.887 5.469 18.3111 -40.5045 4.2748 16.5834 -41.1062 7.7404 13.813 -50.067 4.47
  [5,24,13.536,-49.887,5.469,18.3111,-40.5045,4.2748,16.5834,-41.1062,7.7404,13.813,-50.067,4.47],
// 5 24 10.201 -48.465 4.208 8.007 -49.095 4.35 10.103 -48.251 5.085 7.953 -48.856 3.803
  [5,24,10.201,-48.465,4.208,8.007,-49.095,4.35,10.103,-48.251,5.085,7.953,-48.856,3.803],
// 5 24 0 -45.35 11.129 0 -41.729 8.758 .729 -45.412 10.968 -.729 -45.412 10.968
  [5,24,0,-45.35,11.129,0,-41.729,8.758,.729,-45.412,10.968,-.729,-45.412,10.968],
// 5 24 7.953 -48.856 3.803 8.2361 -46.0615 2.5466 5.6283 -46.5498 2.9542 9.1151 -45.6603 2.2726
  [5,24,7.953,-48.856,3.803,8.2361,-46.0615,2.5466,5.6283,-46.5498,2.9542,9.1151,-45.6603,2.2726],
// 5 24 9.9792 -45.3358 1.2634 7.816 -46.537 .744 16.8545 -41.7735 .69 9.1151 -45.6603 2.2726
  [5,24,9.9792,-45.3358,1.2634,7.816,-46.537,.744,16.8545,-41.7735,.69,9.1151,-45.6603,2.2726],
// 5 24 0 -26.334 25.133 0 -35.548 22.104 9.186 -25.986 24.215 -9.186 -25.986 24.215
  [5,24,0,-26.334,25.133,0,-35.548,22.104,9.186,-25.986,24.215,-9.186,-25.986,24.215],
// 5 24 7.955 -48.963 4.893 8.884 -45.141 6.219 5.4373 -46.0437 5.7282 10.103 -48.251 5.085
  [5,24,7.955,-48.963,4.893,8.884,-45.141,6.219,5.4373,-46.0437,5.7282,10.103,-48.251,5.085],
// 5 24 22.944 -37.286 5.56 17.343 -40.632 8.379 18.3111 -40.5045 4.2748 17.633 -37.512 13.322
  [5,24,22.944,-37.286,5.56,17.343,-40.632,8.379,18.3111,-40.5045,4.2748,17.633,-37.512,13.322],
// 5 24 0 -42.304 -15.101 0 -38.822 -18.54 5.103 -40.339 -16.601 -5.103 -40.339 -16.601
  [5,24,0,-42.304,-15.101,0,-38.822,-18.54,5.103,-40.339,-16.601,-5.103,-40.339,-16.601],
// 5 24 0 -8.758 21.512 0 -17.551 25.557 8.71 -9.243 20.71 -8.71 -9.243 20.71
  [5,24,0,-8.758,21.512,0,-17.551,25.557,8.71,-9.243,20.71,-8.71,-9.243,20.71],
// 5 24 5.6283 -46.5498 2.9542 7.816 -46.537 .744 8.2361 -46.0615 2.5466 .741 -46.658 7.398
  [5,24,5.6283,-46.5498,2.9542,7.816,-46.537,.744,8.2361,-46.0615,2.5466,.741,-46.658,7.398],
// 5 24 18.3111 -40.5045 4.2748 17.343 -40.632 8.379 16.5834 -41.1062 7.7404 22.944 -37.286 5.56
  [5,24,18.3111,-40.5045,4.2748,17.343,-40.632,8.379,16.5834,-41.1062,7.7404,22.944,-37.286,5.56],
// 5 24 22.944 -37.286 5.56 18.3111 -40.5045 4.2748 17.343 -40.632 8.379 16.8545 -41.7735 .69
  [5,24,22.944,-37.286,5.56,18.3111,-40.5045,4.2748,17.343,-40.632,8.379,16.8545,-41.7735,.69],
// 5 24 7.816 -46.537 .744 18.107 -41.424 -2.02 16.8545 -41.7735 .69 6.094 -45.384 -7.656
  [5,24,7.816,-46.537,.744,18.107,-41.424,-2.02,16.8545,-41.7735,.69,6.094,-45.384,-7.656],
// 5 24 0 -35.548 22.104 0 -42.542 15.997 10.199 -40.515 15.472 -10.199 -40.515 15.472
  [5,24,0,-35.548,22.104,0,-42.542,15.997,10.199,-40.515,15.472,-10.199,-40.515,15.472],
// 5 24 13.341 -49.935 3.526 9.9792 -45.3358 1.2634 16.8545 -41.7735 .69 11.77 -50.025 3.5
  [5,24,13.341,-49.935,3.526,9.9792,-45.3358,1.2634,16.8545,-41.7735,.69,11.77,-50.025,3.5],
// 5 24 1.886 -46.287 8.497 5.4373 -46.0437 5.7282 8.884 -45.141 6.219 .741 -46.658 7.398
  [5,24,1.886,-46.287,8.497,5.4373,-46.0437,5.7282,8.884,-45.141,6.219,.741,-46.658,7.398],
// 5 24 13.813 -50.067 4.47 18.3111 -40.5045 4.2748 16.8545 -41.7735 .69 13.536 -49.887 5.469
  [5,24,13.813,-50.067,4.47,18.3111,-40.5045,4.2748,16.8545,-41.7735,.69,13.536,-49.887,5.469],
// 5 24 0 -43.753 5.507 0 -46.711 7.236 -.833 -43.674 5.633 .833 -43.674 5.633
  [5,24,0,-43.753,5.507,0,-46.711,7.236,-.833,-43.674,5.633,.833,-43.674,5.633],
// 5 24 0 -.433 8.9147 0 .457 9.8847 10.002 -2.425 8.058 -10.002 -2.425 8.058
  [5,24,0,-.433,8.9147,0,.457,9.8847,10.002,-2.425,8.058,-10.002,-2.425,8.058],
// 5 24 8.2361 -46.0615 2.5466 7.816 -46.537 .744 9.1151 -45.6603 2.2726 5.6283 -46.5498 2.9542
  [5,24,8.2361,-46.0615,2.5466,7.816,-46.537,.744,9.1151,-45.6603,2.2726,5.6283,-46.5498,2.9542],
// 5 24 7.953 -48.856 3.803 10.201 -48.465 4.208 9.974 -47.995 3.392 8.007 -49.095 4.35
  [5,24,7.953,-48.856,3.803,10.201,-48.465,4.208,9.974,-47.995,3.392,8.007,-49.095,4.35],
// 5 24 9.7063 -44.6496 7.1365 13.536 -49.887 5.469 16.5834 -41.1062 7.7404 11.57 -49.931 5.254
  [5,24,9.7063,-44.6496,7.1365,13.536,-49.887,5.469,16.5834,-41.1062,7.7404,11.57,-49.931,5.254],
// 5 24 11.65 -50.207 4.398 13.536 -49.887 5.469 11.57 -49.931 5.254 13.813 -50.067 4.47
  [5,24,11.65,-50.207,4.398,13.536,-49.887,5.469,11.57,-49.931,5.254,13.813,-50.067,4.47],
// 5 24 0 -47.528 .308 0 -46.336 -6.759 7.816 -46.537 .744 -7.816 -46.537 .744
  [5,24,0,-47.528,.308,0,-46.336,-6.759,7.816,-46.537,.744,-7.816,-46.537,.744],
// 5 24 16.5834 -41.1062 7.7404 17.343 -40.632 8.379 9.832 -44.255 9.395 18.3111 -40.5045 4.2748
  [5,24,16.5834,-41.1062,7.7404,17.343,-40.632,8.379,9.832,-44.255,9.395,18.3111,-40.5045,4.2748],
// 5 24 4.8577 -46.4585 4.3258 8.007 -49.095 4.35 7.955 -48.963 4.893 7.953 -48.856 3.803
  [5,24,4.8577,-46.4585,4.3258,8.007,-49.095,4.35,7.955,-48.963,4.893,7.953,-48.856,3.803],
// 5 24 18.107 -41.424 -2.02 22.944 -37.286 5.56 24.396 -34.873 -5.319 16.8545 -41.7735 .69
  [5,24,18.107,-41.424,-2.02,22.944,-37.286,5.56,24.396,-34.873,-5.319,16.8545,-41.7735,.69],
// 5 24 10.103 -48.251 5.085 11.65 -50.207 4.398 10.201 -48.465 4.208 11.57 -49.931 5.254
  [5,24,10.103,-48.251,5.085,11.65,-50.207,4.398,10.201,-48.465,4.208,11.57,-49.931,5.254],
// 5 24 4.8577 -46.4585 4.3258 7.953 -48.856 3.803 5.6283 -46.5498 2.9542 8.007 -49.095 4.35
  [5,24,4.8577,-46.4585,4.3258,7.953,-48.856,3.803,5.6283,-46.5498,2.9542,8.007,-49.095,4.35],
// 5 24 4.8577 -46.4585 4.3258 .741 -46.658 7.398 5.6283 -46.5498 2.9542 5.4373 -46.0437 5.7282
  [5,24,4.8577,-46.4585,4.3258,.741,-46.658,7.398,5.6283,-46.5498,2.9542,5.4373,-46.0437,5.7282],
// 5 24 0 -46.336 -6.759 0 -42.304 -15.101 6.094 -45.384 -7.656 -6.094 -45.384 -7.656
  [5,24,0,-46.336,-6.759,0,-42.304,-15.101,6.094,-45.384,-7.656,-6.094,-45.384,-7.656],
// 5 24 7.953 -48.856 3.803 9.1151 -45.6603 2.2726 8.2361 -46.0615 2.5466 9.974 -47.995 3.392
  [5,24,7.953,-48.856,3.803,9.1151,-45.6603,2.2726,8.2361,-46.0615,2.5466,9.974,-47.995,3.392],
// 5 24 17.343 -40.632 8.379 9.832 -44.255 9.395 16.5834 -41.1062 7.7404 10.199 -40.515 15.472
  [5,24,17.343,-40.632,8.379,9.832,-44.255,9.395,16.5834,-41.1062,7.7404,10.199,-40.515,15.472],
// 5 24 0 -2.352 14.951 0 -8.758 21.512 9.904 -3.614 14.554 -9.904 -3.614 14.554
  [5,24,0,-2.352,14.951,0,-8.758,21.512,9.904,-3.614,14.554,-9.904,-3.614,14.554],
// 5 24 5.4373 -46.0437 5.7282 .741 -46.658 7.398 1.886 -46.287 8.497 4.8577 -46.4585 4.3258
  [5,24,5.4373,-46.0437,5.7282,.741,-46.658,7.398,1.886,-46.287,8.497,4.8577,-46.4585,4.3258],
// 5 24 16.8545 -41.7735 .69 22.944 -37.286 5.56 18.3111 -40.5045 4.2748 18.107 -41.424 -2.02
  [5,24,16.8545,-41.7735,.69,22.944,-37.286,5.56,18.3111,-40.5045,4.2748,18.107,-41.424,-2.02],
// 5 24 7.955 -48.963 4.893 4.8577 -46.4585 4.3258 8.007 -49.095 4.35 5.4373 -46.0437 5.7282
  [5,24,7.955,-48.963,4.893,4.8577,-46.4585,4.3258,8.007,-49.095,4.35,5.4373,-46.0437,5.7282],
// 5 24 11.57 -49.931 5.254 8.884 -45.141 6.219 10.103 -48.251 5.085 9.7063 -44.6496 7.1365
  [5,24,11.57,-49.931,5.254,8.884,-45.141,6.219,10.103,-48.251,5.085,9.7063,-44.6496,7.1365],
// 5 24 11.65 -50.207 4.398 10.201 -48.465 4.208 9.974 -47.995 3.392 10.103 -48.251 5.085
  [5,24,11.65,-50.207,4.398,10.201,-48.465,4.208,9.974,-47.995,3.392,10.103,-48.251,5.085],
// 5 24 8.007 -49.095 4.35 10.103 -48.251 5.085 10.201 -48.465 4.208 7.955 -48.963 4.893
  [5,24,8.007,-49.095,4.35,10.103,-48.251,5.085,10.201,-48.465,4.208,7.955,-48.963,4.893],
// 5 24 8.884 -45.141 6.219 9.832 -44.255 9.395 9.7063 -44.6496 7.1365 1.886 -46.287 8.497
  [5,24,8.884,-45.141,6.219,9.832,-44.255,9.395,9.7063,-44.6496,7.1365,1.886,-46.287,8.497],
// 5 24 0 -46.711 7.236 0 -47.528 .308 .741 -46.658 7.398 -.741 -46.658 7.398
  [5,24,0,-46.711,7.236,0,-47.528,.308,.741,-46.658,7.398,-.741,-46.658,7.398],
// 5 24 11.65 -50.207 4.398 13.813 -50.067 4.47 13.536 -49.887 5.469 13.341 -49.935 3.526
  [5,24,11.65,-50.207,4.398,13.813,-50.067,4.47,13.536,-49.887,5.469,13.341,-49.935,3.526],
// 5 24 9.1151 -45.6603 2.2726 7.816 -46.537 .744 9.9792 -45.3358 1.2634 8.2361 -46.0615 2.5466
  [5,24,9.1151,-45.6603,2.2726,7.816,-46.537,.744,9.9792,-45.3358,1.2634,8.2361,-46.0615,2.5466],
];
module ldraw_lib__u9447(step=0, col=false, unit=2/5, alt=false, line=0.2, solid=!$preview)
    makepoly(ldraw_lib__u9447(), step=step, col=col, unit=unit, alt=alt, line=line, solid=solid);
ldraw_lib__u9447(line=0.2);
